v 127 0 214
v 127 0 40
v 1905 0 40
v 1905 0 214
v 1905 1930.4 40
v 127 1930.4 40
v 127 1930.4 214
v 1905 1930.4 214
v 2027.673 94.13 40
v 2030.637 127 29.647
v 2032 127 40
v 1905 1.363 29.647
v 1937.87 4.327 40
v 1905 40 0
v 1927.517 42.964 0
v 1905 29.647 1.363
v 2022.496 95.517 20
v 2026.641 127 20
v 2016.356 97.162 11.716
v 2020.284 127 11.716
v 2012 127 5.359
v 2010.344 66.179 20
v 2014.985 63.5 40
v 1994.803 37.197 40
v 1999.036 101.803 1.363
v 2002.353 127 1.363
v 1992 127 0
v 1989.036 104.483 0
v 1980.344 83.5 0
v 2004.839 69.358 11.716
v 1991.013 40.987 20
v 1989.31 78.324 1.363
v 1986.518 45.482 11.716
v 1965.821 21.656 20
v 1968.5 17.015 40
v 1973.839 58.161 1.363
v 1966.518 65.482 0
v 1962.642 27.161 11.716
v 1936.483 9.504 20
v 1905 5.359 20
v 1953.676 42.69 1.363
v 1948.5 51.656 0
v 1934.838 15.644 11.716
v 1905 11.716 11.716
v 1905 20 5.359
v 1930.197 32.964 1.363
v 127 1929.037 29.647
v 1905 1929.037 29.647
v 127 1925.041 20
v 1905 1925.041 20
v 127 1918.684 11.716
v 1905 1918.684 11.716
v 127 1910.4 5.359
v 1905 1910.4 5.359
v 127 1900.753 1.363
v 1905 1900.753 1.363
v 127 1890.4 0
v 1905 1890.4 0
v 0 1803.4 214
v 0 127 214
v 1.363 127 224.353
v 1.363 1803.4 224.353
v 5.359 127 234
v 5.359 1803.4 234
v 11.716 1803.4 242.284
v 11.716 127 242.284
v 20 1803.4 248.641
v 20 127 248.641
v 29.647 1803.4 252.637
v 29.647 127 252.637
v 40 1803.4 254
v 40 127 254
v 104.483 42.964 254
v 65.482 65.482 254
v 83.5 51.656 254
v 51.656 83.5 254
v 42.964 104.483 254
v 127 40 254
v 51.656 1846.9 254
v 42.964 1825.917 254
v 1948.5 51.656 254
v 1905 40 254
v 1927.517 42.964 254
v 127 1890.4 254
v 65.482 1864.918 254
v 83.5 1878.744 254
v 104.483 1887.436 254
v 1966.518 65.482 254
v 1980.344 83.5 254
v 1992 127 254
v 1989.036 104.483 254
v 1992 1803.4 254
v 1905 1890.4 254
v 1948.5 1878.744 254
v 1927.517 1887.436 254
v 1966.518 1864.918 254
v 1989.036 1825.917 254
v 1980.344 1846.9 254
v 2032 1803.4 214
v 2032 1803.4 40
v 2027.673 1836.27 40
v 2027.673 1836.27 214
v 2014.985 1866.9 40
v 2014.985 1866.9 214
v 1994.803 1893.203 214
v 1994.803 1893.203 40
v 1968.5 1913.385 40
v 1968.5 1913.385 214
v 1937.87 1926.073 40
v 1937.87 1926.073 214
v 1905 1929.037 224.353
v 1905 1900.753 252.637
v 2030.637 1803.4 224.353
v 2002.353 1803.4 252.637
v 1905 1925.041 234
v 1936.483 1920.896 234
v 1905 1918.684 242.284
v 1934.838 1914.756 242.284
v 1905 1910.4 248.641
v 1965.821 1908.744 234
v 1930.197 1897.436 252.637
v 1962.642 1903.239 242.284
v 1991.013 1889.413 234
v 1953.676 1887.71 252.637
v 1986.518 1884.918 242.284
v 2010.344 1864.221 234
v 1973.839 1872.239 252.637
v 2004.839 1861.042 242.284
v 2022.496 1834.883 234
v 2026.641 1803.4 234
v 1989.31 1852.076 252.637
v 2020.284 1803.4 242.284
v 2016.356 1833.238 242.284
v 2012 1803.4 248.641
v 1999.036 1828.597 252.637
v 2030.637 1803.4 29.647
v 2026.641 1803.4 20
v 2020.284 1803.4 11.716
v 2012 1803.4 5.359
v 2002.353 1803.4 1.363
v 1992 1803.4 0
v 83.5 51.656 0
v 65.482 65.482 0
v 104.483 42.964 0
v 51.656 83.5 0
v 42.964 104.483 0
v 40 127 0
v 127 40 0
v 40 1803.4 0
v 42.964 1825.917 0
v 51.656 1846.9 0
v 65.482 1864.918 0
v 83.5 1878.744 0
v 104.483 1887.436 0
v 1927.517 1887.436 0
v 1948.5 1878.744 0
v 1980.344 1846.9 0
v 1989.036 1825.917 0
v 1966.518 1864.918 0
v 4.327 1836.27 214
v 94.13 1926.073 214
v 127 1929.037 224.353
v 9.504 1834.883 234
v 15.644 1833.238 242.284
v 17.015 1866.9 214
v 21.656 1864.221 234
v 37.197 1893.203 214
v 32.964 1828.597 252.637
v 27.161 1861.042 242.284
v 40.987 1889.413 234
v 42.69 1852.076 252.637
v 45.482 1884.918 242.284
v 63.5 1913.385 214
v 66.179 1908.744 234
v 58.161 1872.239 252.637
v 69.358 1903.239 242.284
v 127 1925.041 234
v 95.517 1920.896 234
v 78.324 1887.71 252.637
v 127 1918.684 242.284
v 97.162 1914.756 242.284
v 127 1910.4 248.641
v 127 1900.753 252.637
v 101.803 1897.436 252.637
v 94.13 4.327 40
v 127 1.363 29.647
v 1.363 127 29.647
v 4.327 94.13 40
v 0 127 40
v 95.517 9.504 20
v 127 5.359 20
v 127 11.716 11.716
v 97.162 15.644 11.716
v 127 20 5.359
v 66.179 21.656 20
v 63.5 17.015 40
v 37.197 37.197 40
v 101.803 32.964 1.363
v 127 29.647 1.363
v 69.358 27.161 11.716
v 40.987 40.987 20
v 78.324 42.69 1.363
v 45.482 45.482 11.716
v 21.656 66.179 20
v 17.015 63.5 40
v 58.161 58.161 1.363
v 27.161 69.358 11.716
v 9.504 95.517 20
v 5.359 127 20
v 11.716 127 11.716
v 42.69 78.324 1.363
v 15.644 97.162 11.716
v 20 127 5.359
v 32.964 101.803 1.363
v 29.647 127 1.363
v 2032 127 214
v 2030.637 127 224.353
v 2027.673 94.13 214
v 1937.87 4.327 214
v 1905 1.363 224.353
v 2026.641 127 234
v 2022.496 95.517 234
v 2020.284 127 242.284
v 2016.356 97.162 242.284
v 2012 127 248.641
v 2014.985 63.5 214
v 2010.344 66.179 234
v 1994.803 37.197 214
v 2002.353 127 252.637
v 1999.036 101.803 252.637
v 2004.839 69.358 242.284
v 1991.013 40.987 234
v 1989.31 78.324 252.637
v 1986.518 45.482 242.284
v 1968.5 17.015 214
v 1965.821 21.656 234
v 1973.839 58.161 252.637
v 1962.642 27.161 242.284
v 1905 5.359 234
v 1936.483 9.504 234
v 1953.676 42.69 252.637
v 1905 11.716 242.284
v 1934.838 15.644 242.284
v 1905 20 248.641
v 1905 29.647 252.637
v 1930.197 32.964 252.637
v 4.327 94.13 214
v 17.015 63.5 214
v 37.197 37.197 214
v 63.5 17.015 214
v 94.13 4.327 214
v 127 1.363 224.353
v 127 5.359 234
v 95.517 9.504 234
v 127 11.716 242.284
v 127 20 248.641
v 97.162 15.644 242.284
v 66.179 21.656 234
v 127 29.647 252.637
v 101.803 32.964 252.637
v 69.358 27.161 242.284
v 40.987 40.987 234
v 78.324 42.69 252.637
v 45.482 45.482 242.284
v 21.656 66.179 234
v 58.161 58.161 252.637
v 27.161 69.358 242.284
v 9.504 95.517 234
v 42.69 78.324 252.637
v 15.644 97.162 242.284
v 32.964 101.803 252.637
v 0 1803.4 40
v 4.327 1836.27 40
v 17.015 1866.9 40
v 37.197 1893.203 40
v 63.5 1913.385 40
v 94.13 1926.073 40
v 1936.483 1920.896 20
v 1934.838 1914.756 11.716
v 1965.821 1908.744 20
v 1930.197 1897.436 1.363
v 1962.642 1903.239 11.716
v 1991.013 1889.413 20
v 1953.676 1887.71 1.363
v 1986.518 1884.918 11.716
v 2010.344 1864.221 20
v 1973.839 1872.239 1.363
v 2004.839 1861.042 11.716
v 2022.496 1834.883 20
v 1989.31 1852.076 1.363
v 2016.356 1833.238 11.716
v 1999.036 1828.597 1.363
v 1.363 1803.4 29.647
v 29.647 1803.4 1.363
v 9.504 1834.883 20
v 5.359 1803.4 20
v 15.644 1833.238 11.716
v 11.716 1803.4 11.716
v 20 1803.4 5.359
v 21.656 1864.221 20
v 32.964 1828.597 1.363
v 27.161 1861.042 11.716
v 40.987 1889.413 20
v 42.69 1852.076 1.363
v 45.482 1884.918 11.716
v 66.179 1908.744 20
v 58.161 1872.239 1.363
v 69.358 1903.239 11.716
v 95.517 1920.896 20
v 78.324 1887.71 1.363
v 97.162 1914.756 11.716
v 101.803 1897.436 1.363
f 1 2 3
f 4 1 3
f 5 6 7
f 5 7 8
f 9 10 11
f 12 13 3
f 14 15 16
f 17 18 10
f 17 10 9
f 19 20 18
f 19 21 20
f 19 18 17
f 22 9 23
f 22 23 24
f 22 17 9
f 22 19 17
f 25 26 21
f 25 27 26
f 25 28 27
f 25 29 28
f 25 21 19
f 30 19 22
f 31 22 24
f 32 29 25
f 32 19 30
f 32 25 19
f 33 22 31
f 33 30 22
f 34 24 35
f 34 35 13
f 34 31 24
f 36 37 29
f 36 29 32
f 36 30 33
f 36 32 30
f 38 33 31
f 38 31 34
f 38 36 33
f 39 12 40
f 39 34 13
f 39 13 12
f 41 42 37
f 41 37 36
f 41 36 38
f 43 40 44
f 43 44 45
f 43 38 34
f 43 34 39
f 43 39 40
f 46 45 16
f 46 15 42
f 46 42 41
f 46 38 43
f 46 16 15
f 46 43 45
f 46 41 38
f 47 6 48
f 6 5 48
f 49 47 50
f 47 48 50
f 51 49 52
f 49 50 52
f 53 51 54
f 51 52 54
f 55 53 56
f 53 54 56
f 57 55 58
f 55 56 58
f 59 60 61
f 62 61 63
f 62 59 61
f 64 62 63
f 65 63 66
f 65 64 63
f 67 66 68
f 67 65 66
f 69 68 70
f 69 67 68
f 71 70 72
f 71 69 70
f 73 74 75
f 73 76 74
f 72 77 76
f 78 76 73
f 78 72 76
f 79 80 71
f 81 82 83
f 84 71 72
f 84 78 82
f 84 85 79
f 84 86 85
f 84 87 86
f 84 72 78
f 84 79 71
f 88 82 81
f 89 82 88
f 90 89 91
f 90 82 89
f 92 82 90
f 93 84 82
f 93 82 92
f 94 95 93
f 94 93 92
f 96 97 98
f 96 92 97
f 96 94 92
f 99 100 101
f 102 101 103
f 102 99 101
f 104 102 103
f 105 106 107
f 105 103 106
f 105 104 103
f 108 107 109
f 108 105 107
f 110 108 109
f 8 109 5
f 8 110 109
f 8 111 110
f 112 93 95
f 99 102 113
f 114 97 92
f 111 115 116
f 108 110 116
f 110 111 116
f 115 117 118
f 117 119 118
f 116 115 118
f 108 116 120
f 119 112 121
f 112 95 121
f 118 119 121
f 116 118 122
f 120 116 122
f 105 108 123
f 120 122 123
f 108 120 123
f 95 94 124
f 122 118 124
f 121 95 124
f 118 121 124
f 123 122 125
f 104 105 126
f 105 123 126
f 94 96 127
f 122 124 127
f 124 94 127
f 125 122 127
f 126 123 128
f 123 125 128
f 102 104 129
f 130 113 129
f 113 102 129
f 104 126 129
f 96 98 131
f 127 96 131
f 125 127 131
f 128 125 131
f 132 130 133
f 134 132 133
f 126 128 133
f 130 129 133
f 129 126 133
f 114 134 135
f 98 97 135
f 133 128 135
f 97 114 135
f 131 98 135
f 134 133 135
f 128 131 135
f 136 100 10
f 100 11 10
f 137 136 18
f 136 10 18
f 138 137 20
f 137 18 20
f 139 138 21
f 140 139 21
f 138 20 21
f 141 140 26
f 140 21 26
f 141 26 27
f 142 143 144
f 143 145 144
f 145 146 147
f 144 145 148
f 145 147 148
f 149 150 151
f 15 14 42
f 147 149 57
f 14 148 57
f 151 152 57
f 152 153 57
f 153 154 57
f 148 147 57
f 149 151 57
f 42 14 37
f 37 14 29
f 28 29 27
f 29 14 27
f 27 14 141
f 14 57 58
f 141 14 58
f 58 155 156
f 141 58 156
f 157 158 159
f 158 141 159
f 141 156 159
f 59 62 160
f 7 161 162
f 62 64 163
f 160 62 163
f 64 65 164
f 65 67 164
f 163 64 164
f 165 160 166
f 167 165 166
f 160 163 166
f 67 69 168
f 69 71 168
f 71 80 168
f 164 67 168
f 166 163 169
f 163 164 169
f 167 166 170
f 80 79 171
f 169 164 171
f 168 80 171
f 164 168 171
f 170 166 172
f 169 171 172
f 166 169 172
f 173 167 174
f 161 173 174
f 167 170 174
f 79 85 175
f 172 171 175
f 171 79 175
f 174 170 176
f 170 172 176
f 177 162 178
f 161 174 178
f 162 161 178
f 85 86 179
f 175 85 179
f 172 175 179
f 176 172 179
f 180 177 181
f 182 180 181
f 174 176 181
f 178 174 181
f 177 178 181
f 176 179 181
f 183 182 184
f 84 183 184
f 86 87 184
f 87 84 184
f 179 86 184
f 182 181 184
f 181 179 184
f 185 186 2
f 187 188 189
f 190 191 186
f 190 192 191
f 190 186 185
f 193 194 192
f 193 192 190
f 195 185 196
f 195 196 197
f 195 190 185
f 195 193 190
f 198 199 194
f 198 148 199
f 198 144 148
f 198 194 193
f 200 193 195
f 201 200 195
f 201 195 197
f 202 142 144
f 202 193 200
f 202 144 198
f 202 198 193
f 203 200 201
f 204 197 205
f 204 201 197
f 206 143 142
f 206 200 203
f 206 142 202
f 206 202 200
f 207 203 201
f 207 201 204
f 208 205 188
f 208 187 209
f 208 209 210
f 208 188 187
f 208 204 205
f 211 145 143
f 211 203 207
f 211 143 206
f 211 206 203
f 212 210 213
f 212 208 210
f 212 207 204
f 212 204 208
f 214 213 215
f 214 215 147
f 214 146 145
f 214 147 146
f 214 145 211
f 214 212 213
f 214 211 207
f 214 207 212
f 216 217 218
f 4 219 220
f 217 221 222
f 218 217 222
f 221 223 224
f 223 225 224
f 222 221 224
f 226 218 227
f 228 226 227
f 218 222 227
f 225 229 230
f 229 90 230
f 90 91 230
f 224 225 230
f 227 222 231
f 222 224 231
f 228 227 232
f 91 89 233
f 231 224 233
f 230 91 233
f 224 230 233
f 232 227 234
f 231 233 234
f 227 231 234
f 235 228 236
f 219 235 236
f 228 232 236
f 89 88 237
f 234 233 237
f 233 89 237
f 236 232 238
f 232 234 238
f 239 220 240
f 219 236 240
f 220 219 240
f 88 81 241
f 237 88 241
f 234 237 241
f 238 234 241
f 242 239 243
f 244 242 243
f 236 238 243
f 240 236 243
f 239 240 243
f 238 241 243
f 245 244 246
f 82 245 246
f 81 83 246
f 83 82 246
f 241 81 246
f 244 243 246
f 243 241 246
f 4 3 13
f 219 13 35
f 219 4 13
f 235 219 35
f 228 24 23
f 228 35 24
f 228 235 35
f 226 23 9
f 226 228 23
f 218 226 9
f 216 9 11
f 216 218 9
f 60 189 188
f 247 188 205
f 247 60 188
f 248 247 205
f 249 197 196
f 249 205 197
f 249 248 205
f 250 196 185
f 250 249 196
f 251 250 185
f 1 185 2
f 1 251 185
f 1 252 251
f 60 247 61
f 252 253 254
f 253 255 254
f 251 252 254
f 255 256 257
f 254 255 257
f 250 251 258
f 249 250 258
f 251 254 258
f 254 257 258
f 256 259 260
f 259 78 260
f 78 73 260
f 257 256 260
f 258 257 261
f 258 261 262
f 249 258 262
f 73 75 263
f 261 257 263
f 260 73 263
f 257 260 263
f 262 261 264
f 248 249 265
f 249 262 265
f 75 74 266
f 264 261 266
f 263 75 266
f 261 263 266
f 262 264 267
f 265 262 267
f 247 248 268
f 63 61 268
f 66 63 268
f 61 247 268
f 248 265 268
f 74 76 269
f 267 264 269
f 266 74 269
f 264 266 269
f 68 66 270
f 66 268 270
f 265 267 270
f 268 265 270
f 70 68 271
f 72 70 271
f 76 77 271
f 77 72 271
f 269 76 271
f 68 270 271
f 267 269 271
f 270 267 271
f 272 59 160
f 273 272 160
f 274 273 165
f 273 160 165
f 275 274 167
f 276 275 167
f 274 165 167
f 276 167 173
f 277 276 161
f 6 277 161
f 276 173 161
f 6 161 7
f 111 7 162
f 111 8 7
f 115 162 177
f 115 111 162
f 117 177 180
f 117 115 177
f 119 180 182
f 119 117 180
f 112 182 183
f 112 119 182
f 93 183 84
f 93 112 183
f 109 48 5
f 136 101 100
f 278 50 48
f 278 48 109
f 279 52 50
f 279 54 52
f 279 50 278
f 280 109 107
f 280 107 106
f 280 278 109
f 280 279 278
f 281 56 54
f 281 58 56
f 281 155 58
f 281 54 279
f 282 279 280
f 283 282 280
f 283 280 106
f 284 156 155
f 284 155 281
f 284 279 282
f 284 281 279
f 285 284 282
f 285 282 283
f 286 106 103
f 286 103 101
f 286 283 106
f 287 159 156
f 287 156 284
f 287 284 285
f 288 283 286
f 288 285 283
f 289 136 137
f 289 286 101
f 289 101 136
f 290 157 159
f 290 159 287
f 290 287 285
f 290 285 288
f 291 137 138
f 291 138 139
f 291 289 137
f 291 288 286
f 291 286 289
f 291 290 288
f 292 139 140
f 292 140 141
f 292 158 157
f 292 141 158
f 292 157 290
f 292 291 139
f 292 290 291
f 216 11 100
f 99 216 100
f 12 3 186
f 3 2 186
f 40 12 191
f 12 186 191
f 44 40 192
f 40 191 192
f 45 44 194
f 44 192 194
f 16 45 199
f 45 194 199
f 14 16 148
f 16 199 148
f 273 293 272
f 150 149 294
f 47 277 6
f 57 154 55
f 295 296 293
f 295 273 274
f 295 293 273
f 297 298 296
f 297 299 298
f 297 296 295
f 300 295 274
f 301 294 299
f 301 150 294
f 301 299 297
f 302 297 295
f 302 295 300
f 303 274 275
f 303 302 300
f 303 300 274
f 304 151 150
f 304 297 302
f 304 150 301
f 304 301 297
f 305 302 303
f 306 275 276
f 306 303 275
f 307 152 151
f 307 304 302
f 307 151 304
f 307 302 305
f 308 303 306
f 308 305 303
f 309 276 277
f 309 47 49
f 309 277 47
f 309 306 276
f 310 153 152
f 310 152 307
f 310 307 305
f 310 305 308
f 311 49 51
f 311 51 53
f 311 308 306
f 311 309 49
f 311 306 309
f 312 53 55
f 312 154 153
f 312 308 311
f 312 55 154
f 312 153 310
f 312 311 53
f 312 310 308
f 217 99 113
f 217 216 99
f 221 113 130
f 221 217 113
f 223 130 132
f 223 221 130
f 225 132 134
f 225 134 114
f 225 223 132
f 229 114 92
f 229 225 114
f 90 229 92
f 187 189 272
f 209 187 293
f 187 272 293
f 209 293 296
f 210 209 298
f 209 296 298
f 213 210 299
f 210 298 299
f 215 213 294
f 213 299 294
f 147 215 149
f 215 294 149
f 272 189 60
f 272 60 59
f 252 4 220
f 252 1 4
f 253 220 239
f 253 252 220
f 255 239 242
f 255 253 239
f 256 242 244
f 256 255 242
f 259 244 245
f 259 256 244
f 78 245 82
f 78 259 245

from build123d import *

# Parameters (mm, degrees)
SKETCH1_W           = 2032
SKETCH1_H           = 1930.4
BOSS_EXTRUDE1_DEPTH = 254
FILLET1_R           = 127
FILLET2_R           = 40


with BuildPart() as part:
    # Sketch1 → Boss-Extrude1 (new body)
    with BuildSketch(Plane.XY):
        with Locations((1016, 965.2)):
            Rectangle(SKETCH1_W, SKETCH1_H)
    extrude(amount=BOSS_EXTRUDE1_DEPTH)

    # Fillet1
    fillet1_edges = [part.edges().sort_by_distance(p)[0] for p in [
        (0, 1930.4, 127),
        (2032, 1930.4, 127),
        (2032, 0, 127),
        (0, 0, 127),
    ]]
    fillet(fillet1_edges, radius=FILLET1_R)

    # Fillet2
    fillet2_edges = [part.edges().sort_by_distance(p)[0] for p in [
        (0, 965.2, 0),
        (0, 965.2, 254),
        (1016, 1930.4, 0),
        (2032, 965.2, 0),
        (1016, 0, 0),
        (1994.802561211, 1893.202561211, 0),
        (1994.802561211, 37.197438789, 0),
        (37.197438789, 37.197438789, 0),
        (37.197438789, 1893.202561211, 0),
        (1016, 1930.4, 254),
        (1016, 0, 254),
        (2032, 965.2, 254),
        (1994.802561211, 1893.202561211, 254),
        (1994.802561211, 37.197438789, 254),
        (37.197438789, 37.197438789, 254),
        (37.197438789, 1893.202561211, 254),
    ]]
    fillet(fillet2_edges, radius=FILLET2_R)


solid = part.part
